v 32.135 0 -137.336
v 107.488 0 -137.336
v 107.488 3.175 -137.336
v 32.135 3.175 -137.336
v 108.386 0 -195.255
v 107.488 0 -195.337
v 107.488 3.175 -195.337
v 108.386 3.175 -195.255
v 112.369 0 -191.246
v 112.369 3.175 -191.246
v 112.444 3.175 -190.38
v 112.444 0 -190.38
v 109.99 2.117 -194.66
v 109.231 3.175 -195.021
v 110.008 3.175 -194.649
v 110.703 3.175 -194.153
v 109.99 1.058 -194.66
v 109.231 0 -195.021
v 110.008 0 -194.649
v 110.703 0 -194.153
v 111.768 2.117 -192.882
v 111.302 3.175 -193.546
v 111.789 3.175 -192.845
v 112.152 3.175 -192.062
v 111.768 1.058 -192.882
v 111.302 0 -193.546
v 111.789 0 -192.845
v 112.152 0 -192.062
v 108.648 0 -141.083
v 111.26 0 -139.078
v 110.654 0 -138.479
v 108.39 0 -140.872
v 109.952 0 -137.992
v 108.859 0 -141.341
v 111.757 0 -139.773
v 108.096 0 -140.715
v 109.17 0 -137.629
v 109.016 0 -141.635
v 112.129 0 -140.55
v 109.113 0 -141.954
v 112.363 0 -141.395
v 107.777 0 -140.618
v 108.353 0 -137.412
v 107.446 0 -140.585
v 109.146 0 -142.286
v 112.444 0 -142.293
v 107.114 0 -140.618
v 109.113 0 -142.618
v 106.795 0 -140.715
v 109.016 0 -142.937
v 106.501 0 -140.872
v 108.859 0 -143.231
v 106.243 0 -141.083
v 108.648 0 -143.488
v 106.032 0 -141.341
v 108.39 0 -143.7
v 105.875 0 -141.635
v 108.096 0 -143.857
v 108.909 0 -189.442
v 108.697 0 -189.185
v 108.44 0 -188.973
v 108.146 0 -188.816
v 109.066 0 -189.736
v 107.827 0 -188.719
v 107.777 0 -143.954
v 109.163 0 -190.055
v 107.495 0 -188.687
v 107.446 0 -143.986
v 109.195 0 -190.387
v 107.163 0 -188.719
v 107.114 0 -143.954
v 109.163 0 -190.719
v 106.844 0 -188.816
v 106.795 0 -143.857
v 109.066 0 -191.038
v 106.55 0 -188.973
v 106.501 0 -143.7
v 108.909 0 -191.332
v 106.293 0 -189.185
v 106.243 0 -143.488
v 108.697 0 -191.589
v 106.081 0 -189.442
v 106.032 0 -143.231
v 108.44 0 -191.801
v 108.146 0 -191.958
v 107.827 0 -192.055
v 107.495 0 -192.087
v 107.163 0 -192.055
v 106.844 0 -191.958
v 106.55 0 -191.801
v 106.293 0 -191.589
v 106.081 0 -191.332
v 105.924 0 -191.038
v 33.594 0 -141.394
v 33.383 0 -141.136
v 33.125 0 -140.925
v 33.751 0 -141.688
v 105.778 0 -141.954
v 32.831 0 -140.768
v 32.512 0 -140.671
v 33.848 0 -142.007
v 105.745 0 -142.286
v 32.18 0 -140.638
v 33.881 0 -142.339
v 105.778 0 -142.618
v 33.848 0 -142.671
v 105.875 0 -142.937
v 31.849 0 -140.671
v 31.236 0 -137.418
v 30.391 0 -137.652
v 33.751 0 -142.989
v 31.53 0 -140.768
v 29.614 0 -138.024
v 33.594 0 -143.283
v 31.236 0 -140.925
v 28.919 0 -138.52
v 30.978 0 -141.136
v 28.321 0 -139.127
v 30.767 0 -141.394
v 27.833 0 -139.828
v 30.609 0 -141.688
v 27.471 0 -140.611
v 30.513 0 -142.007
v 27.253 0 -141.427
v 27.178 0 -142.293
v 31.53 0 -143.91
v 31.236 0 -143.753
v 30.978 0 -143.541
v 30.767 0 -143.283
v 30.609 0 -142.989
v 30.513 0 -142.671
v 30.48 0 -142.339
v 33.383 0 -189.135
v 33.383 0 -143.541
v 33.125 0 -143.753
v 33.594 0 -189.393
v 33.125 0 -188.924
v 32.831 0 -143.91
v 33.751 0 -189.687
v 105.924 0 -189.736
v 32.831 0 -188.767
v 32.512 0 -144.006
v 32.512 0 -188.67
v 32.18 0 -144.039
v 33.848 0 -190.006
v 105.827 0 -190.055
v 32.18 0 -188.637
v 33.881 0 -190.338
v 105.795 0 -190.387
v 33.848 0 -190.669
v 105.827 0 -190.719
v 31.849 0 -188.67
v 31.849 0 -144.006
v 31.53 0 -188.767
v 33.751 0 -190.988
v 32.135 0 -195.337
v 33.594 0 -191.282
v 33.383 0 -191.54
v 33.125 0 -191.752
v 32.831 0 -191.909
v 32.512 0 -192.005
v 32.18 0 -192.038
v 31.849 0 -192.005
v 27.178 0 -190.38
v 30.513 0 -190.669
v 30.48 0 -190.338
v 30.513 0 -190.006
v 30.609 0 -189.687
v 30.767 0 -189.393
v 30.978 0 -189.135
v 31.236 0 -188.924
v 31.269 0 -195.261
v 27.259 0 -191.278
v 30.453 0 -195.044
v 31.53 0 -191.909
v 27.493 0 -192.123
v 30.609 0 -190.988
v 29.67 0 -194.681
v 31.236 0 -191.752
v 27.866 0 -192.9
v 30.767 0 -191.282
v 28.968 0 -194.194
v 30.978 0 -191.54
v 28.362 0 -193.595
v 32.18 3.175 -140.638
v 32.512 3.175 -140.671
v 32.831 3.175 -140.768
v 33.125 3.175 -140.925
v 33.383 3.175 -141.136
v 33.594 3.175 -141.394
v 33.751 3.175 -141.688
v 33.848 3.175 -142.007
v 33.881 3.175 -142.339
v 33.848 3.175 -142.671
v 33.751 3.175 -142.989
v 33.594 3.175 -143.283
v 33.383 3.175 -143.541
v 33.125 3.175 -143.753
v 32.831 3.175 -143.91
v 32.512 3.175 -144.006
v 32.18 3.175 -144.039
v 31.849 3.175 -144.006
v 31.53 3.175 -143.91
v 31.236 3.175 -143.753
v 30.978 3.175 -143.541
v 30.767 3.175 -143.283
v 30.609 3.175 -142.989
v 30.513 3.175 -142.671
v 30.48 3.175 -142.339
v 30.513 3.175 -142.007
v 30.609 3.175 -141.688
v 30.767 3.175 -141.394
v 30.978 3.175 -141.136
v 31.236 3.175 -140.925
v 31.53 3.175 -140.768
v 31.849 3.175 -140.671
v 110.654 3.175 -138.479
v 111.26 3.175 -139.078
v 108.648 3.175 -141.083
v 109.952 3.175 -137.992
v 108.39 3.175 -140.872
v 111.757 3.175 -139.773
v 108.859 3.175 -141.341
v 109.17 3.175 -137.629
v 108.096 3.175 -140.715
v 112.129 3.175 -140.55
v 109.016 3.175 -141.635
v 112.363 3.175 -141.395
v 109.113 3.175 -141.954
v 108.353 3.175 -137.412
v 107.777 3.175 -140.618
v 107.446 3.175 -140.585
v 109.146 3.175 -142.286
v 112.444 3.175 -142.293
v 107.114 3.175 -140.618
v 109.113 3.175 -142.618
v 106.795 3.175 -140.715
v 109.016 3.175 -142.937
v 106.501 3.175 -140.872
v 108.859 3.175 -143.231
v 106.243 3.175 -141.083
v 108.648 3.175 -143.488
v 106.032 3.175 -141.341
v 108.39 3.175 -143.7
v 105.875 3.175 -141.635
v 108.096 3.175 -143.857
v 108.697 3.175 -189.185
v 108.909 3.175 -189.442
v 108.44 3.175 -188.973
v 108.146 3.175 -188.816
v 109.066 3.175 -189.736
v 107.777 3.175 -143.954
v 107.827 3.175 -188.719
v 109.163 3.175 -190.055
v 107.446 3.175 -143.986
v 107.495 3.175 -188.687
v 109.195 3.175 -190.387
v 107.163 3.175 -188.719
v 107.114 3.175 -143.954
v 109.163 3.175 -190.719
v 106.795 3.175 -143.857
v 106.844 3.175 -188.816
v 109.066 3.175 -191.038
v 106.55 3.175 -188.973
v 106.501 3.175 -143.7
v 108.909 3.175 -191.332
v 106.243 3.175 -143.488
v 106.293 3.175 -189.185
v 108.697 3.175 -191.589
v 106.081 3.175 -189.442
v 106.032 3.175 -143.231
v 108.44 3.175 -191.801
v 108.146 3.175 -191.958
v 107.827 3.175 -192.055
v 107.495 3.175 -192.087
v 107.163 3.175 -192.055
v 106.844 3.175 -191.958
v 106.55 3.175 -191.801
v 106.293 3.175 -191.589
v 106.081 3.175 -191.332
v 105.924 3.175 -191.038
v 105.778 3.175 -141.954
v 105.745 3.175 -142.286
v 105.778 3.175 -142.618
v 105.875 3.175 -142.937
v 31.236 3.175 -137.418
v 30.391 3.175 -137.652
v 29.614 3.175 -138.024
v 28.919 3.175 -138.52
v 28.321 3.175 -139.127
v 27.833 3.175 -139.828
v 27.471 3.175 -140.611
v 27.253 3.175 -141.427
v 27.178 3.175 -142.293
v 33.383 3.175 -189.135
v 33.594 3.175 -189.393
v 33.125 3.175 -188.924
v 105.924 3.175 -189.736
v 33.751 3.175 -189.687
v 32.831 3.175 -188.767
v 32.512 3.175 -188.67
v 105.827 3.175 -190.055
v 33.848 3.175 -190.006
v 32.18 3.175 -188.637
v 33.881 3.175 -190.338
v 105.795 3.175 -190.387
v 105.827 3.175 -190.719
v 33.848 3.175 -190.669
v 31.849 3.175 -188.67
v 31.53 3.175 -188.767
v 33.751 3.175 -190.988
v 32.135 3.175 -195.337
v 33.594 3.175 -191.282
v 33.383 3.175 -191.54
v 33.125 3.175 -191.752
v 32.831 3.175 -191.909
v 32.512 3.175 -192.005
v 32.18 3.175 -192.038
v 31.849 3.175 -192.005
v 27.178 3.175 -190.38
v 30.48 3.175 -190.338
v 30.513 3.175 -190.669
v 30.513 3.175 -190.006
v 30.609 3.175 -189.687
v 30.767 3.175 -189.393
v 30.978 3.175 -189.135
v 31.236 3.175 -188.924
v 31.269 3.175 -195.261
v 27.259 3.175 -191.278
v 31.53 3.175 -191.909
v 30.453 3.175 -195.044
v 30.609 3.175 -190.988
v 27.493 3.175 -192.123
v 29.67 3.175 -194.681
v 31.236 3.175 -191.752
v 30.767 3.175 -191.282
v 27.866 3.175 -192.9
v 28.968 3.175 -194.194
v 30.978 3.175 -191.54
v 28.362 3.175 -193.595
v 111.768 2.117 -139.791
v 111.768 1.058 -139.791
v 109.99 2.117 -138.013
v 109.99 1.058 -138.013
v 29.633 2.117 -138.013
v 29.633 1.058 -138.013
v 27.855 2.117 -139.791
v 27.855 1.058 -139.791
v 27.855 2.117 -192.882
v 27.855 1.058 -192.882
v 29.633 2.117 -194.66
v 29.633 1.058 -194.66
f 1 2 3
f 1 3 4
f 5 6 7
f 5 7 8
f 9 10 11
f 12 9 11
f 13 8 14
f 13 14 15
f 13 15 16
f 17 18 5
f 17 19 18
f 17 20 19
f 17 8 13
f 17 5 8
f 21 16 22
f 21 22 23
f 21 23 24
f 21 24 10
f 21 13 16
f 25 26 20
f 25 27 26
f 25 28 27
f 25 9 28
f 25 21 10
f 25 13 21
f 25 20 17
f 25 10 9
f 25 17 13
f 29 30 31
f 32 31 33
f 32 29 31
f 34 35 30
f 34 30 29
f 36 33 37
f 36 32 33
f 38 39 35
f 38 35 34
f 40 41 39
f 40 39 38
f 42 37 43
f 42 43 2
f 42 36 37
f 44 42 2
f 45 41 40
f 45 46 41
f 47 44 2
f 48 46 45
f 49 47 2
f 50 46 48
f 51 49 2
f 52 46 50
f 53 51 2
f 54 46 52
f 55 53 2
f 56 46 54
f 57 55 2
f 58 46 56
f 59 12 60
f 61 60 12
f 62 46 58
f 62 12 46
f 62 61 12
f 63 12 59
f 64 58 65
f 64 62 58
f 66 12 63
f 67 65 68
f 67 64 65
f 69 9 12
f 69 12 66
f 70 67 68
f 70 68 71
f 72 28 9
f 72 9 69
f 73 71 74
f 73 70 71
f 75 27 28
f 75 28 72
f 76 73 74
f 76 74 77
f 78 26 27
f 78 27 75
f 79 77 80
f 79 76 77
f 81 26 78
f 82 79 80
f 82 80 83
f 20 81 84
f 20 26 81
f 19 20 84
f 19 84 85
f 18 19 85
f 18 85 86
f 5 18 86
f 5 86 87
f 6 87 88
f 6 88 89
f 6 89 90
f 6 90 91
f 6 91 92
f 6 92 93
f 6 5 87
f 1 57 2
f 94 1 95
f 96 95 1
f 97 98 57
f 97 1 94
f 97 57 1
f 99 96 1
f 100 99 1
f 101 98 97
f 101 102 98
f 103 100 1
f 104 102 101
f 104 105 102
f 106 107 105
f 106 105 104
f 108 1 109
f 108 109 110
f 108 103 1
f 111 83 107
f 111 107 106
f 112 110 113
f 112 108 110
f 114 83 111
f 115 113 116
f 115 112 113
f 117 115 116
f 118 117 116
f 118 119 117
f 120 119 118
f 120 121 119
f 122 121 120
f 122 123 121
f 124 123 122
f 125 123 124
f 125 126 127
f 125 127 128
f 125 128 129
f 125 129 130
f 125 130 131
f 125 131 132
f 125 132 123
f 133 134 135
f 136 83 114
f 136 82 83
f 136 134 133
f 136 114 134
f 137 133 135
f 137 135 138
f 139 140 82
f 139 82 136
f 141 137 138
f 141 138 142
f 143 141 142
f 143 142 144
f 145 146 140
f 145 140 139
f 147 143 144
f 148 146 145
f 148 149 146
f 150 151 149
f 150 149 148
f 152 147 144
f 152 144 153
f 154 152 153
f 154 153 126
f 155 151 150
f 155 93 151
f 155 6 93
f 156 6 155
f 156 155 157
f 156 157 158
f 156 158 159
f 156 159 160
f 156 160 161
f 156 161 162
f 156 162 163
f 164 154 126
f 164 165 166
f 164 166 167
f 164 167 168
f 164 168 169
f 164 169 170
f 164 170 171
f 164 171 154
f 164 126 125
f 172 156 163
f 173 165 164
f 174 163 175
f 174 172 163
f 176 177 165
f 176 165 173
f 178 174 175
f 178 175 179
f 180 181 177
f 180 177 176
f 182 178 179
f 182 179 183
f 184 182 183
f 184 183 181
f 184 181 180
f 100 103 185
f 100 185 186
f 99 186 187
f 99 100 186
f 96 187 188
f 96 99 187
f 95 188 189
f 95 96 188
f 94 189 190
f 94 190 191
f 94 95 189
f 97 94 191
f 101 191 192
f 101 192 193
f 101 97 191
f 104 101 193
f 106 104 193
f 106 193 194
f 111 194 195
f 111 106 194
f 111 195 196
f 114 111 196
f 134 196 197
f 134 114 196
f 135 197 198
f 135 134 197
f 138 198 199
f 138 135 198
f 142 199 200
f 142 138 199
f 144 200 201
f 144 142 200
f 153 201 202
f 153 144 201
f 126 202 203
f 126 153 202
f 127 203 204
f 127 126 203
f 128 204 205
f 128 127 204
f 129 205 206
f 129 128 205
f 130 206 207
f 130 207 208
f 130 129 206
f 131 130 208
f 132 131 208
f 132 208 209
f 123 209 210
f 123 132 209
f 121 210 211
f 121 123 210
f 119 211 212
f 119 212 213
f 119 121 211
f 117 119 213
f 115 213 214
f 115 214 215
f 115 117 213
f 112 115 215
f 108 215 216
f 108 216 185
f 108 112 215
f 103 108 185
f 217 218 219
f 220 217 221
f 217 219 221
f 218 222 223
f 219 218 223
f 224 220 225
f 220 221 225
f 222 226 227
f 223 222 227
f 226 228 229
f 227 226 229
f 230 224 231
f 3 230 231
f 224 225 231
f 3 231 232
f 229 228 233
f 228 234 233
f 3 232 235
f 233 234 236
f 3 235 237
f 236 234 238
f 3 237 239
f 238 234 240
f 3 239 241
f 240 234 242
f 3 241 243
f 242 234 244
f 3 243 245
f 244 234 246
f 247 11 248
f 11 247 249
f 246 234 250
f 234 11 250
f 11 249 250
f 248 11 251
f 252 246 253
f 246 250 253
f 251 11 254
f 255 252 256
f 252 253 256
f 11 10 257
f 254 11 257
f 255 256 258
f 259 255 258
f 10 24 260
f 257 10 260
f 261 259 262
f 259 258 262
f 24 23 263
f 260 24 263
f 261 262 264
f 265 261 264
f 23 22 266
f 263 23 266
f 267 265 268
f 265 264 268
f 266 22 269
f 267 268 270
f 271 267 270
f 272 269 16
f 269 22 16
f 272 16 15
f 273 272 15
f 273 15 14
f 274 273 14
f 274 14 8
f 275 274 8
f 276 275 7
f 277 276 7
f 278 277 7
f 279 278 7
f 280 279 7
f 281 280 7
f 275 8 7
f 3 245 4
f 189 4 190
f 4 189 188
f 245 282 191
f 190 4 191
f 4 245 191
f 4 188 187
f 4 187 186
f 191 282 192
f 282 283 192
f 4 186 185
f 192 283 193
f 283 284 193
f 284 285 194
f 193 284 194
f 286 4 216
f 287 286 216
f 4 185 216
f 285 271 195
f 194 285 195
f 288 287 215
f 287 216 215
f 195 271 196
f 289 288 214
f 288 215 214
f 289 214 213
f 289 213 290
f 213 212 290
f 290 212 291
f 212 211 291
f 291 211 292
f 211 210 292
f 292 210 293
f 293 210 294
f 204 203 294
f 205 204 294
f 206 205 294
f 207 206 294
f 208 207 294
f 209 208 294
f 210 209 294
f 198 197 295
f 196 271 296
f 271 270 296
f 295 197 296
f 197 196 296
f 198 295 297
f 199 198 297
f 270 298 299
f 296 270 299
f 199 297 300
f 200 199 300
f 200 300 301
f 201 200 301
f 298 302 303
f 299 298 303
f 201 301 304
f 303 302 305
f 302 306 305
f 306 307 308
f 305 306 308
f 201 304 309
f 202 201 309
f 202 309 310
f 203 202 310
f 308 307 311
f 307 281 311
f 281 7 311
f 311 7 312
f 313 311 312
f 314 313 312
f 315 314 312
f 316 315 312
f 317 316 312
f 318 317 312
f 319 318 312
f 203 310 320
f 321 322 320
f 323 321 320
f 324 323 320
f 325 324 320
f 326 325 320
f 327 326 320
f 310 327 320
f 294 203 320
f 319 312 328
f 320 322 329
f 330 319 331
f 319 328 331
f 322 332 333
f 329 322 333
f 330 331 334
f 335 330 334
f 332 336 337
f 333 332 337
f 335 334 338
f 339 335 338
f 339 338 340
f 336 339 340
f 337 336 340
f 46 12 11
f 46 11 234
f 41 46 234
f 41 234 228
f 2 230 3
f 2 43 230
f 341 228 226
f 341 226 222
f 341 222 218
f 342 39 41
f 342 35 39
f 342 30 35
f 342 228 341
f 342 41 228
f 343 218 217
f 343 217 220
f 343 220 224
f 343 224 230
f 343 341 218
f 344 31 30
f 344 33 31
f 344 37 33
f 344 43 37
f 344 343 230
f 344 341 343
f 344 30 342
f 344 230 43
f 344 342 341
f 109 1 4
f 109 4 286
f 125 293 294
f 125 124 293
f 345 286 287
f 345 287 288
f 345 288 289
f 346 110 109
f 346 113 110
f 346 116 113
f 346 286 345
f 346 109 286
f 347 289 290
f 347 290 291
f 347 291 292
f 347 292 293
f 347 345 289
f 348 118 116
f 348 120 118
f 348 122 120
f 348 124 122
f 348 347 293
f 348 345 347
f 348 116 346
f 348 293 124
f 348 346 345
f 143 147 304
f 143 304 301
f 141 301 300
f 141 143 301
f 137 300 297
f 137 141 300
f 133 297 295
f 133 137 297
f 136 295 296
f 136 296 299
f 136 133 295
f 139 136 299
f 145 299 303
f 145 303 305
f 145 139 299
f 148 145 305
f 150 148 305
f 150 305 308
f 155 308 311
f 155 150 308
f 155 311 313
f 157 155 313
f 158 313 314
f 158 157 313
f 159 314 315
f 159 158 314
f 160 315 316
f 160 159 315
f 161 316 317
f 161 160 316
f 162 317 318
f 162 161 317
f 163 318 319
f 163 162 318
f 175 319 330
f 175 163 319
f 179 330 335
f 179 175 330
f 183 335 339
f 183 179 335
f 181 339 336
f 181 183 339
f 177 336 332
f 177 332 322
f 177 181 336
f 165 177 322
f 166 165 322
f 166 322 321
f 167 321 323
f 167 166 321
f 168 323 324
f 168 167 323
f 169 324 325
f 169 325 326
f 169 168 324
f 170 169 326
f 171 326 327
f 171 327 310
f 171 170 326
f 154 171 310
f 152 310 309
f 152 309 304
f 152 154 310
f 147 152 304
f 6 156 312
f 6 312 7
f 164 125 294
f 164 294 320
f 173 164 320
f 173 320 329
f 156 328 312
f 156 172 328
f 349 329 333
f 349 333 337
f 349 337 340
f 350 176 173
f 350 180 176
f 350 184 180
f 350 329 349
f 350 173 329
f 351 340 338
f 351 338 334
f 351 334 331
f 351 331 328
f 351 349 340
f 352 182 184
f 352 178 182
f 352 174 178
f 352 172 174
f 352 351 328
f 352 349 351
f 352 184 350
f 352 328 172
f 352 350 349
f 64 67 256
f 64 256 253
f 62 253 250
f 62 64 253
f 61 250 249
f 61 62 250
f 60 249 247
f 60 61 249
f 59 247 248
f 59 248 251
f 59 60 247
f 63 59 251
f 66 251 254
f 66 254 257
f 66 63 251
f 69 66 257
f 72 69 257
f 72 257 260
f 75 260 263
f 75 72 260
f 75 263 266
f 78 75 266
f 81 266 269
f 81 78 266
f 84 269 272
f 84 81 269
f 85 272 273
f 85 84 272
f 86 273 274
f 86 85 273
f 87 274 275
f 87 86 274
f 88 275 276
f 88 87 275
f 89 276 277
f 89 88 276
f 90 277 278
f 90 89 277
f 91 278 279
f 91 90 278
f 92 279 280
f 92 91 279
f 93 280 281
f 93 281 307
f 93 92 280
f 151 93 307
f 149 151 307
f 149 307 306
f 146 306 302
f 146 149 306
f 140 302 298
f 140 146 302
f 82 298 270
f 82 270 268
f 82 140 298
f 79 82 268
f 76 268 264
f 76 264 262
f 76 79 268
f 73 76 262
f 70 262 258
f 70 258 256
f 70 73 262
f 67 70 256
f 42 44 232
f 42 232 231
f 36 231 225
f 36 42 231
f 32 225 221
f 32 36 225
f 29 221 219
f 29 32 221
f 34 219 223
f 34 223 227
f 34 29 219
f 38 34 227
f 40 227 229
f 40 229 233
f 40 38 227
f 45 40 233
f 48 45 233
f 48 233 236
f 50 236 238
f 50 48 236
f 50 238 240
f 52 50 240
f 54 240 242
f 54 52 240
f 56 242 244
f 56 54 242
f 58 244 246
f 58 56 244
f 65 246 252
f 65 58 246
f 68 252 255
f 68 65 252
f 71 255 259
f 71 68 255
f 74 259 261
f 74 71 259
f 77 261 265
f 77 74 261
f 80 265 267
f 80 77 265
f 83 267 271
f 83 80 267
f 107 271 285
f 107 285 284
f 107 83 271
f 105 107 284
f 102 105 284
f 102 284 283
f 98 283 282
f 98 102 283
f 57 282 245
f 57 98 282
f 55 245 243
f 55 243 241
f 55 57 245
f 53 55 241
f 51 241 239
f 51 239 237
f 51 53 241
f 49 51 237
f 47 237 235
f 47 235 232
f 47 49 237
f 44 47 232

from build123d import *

# Parameters (mm, degrees)
SKETCH2_R           = 1.700388108
SKETCH2_R_2         = 1.700390127
SKETCH2_R_3         = 1.700391472
BOSS_EXTRUDE2_DEPTH = 3.175


with BuildPart() as part:
    # Sketch2 → Boss-Extrude2 (new body)
    with BuildSketch(Plane(origin=(0, 0, 0), x_dir=(1, 0, 0), z_dir=(0, 1, 0))):
        with BuildLine():
            Line((107.487861946, 137.336384548), (32.134526478, 137.336384548))
            add(Edge.make_bspline(
                [(32.134526478, 137.336384548), (29.396970169, 137.336384548), (27.177997625, 139.555359784), (27.177997625, 142.292908018)],
                knots=[1, 1, 1, 1, 2, 2, 2, 2], degree=3))
            Line((27.177997625, 142.292908018), (27.177997625, 190.3800568))
            add(Edge.make_bspline(
                [(27.177997625, 190.3800568), (27.177997625, 193.117610417), (29.396970169, 195.336585653), (32.134526478, 195.336585653)],
                knots=[3, 3, 3, 3, 4, 4, 4, 4], degree=3))
            Line((32.134526478, 195.336585653), (107.487861946, 195.336585653))
            add(Edge.make_bspline(
                [(107.487861946, 195.336585653), (110.225420945, 195.336585653), (112.444385416, 193.1176158), (112.444385416, 190.3800568)],
                knots=[5, 5, 5, 5, 6, 6, 6, 6], degree=3))
            Line((112.444385416, 190.3800568), (112.444385416, 142.292918784))
            add(Edge.make_bspline(
                [(112.444385416, 142.292918784), (112.444385416, 139.555359784), (110.225420945, 137.336384548), (107.487861946, 137.336384548)],
                knots=[7, 7, 7, 7, 8, 8, 8, 8], degree=3))
        make_face()
        with Locations(Location((32.180389311, 190.337721152, 0), (0, 0, 270))):
            Circle(SKETCH2_R, mode=Mode.SUBTRACT)
        with Locations(Location((32.180389311, 142.338781618, 0), (0, 0, 270))):
            Circle(SKETCH2_R_2, mode=Mode.SUBTRACT)
        with Locations(Location((107.445530335, 142.285856339, 0), (0, 0, 270))):
            Circle(SKETCH2_R_3, mode=Mode.SUBTRACT)
        with Locations(Location((107.494913625, 190.38710848, 0), (0, 0, 270))):
            Circle(SKETCH2_R_3, mode=Mode.SUBTRACT)
    extrude(amount=BOSS_EXTRUDE2_DEPTH)


solid = part.part
